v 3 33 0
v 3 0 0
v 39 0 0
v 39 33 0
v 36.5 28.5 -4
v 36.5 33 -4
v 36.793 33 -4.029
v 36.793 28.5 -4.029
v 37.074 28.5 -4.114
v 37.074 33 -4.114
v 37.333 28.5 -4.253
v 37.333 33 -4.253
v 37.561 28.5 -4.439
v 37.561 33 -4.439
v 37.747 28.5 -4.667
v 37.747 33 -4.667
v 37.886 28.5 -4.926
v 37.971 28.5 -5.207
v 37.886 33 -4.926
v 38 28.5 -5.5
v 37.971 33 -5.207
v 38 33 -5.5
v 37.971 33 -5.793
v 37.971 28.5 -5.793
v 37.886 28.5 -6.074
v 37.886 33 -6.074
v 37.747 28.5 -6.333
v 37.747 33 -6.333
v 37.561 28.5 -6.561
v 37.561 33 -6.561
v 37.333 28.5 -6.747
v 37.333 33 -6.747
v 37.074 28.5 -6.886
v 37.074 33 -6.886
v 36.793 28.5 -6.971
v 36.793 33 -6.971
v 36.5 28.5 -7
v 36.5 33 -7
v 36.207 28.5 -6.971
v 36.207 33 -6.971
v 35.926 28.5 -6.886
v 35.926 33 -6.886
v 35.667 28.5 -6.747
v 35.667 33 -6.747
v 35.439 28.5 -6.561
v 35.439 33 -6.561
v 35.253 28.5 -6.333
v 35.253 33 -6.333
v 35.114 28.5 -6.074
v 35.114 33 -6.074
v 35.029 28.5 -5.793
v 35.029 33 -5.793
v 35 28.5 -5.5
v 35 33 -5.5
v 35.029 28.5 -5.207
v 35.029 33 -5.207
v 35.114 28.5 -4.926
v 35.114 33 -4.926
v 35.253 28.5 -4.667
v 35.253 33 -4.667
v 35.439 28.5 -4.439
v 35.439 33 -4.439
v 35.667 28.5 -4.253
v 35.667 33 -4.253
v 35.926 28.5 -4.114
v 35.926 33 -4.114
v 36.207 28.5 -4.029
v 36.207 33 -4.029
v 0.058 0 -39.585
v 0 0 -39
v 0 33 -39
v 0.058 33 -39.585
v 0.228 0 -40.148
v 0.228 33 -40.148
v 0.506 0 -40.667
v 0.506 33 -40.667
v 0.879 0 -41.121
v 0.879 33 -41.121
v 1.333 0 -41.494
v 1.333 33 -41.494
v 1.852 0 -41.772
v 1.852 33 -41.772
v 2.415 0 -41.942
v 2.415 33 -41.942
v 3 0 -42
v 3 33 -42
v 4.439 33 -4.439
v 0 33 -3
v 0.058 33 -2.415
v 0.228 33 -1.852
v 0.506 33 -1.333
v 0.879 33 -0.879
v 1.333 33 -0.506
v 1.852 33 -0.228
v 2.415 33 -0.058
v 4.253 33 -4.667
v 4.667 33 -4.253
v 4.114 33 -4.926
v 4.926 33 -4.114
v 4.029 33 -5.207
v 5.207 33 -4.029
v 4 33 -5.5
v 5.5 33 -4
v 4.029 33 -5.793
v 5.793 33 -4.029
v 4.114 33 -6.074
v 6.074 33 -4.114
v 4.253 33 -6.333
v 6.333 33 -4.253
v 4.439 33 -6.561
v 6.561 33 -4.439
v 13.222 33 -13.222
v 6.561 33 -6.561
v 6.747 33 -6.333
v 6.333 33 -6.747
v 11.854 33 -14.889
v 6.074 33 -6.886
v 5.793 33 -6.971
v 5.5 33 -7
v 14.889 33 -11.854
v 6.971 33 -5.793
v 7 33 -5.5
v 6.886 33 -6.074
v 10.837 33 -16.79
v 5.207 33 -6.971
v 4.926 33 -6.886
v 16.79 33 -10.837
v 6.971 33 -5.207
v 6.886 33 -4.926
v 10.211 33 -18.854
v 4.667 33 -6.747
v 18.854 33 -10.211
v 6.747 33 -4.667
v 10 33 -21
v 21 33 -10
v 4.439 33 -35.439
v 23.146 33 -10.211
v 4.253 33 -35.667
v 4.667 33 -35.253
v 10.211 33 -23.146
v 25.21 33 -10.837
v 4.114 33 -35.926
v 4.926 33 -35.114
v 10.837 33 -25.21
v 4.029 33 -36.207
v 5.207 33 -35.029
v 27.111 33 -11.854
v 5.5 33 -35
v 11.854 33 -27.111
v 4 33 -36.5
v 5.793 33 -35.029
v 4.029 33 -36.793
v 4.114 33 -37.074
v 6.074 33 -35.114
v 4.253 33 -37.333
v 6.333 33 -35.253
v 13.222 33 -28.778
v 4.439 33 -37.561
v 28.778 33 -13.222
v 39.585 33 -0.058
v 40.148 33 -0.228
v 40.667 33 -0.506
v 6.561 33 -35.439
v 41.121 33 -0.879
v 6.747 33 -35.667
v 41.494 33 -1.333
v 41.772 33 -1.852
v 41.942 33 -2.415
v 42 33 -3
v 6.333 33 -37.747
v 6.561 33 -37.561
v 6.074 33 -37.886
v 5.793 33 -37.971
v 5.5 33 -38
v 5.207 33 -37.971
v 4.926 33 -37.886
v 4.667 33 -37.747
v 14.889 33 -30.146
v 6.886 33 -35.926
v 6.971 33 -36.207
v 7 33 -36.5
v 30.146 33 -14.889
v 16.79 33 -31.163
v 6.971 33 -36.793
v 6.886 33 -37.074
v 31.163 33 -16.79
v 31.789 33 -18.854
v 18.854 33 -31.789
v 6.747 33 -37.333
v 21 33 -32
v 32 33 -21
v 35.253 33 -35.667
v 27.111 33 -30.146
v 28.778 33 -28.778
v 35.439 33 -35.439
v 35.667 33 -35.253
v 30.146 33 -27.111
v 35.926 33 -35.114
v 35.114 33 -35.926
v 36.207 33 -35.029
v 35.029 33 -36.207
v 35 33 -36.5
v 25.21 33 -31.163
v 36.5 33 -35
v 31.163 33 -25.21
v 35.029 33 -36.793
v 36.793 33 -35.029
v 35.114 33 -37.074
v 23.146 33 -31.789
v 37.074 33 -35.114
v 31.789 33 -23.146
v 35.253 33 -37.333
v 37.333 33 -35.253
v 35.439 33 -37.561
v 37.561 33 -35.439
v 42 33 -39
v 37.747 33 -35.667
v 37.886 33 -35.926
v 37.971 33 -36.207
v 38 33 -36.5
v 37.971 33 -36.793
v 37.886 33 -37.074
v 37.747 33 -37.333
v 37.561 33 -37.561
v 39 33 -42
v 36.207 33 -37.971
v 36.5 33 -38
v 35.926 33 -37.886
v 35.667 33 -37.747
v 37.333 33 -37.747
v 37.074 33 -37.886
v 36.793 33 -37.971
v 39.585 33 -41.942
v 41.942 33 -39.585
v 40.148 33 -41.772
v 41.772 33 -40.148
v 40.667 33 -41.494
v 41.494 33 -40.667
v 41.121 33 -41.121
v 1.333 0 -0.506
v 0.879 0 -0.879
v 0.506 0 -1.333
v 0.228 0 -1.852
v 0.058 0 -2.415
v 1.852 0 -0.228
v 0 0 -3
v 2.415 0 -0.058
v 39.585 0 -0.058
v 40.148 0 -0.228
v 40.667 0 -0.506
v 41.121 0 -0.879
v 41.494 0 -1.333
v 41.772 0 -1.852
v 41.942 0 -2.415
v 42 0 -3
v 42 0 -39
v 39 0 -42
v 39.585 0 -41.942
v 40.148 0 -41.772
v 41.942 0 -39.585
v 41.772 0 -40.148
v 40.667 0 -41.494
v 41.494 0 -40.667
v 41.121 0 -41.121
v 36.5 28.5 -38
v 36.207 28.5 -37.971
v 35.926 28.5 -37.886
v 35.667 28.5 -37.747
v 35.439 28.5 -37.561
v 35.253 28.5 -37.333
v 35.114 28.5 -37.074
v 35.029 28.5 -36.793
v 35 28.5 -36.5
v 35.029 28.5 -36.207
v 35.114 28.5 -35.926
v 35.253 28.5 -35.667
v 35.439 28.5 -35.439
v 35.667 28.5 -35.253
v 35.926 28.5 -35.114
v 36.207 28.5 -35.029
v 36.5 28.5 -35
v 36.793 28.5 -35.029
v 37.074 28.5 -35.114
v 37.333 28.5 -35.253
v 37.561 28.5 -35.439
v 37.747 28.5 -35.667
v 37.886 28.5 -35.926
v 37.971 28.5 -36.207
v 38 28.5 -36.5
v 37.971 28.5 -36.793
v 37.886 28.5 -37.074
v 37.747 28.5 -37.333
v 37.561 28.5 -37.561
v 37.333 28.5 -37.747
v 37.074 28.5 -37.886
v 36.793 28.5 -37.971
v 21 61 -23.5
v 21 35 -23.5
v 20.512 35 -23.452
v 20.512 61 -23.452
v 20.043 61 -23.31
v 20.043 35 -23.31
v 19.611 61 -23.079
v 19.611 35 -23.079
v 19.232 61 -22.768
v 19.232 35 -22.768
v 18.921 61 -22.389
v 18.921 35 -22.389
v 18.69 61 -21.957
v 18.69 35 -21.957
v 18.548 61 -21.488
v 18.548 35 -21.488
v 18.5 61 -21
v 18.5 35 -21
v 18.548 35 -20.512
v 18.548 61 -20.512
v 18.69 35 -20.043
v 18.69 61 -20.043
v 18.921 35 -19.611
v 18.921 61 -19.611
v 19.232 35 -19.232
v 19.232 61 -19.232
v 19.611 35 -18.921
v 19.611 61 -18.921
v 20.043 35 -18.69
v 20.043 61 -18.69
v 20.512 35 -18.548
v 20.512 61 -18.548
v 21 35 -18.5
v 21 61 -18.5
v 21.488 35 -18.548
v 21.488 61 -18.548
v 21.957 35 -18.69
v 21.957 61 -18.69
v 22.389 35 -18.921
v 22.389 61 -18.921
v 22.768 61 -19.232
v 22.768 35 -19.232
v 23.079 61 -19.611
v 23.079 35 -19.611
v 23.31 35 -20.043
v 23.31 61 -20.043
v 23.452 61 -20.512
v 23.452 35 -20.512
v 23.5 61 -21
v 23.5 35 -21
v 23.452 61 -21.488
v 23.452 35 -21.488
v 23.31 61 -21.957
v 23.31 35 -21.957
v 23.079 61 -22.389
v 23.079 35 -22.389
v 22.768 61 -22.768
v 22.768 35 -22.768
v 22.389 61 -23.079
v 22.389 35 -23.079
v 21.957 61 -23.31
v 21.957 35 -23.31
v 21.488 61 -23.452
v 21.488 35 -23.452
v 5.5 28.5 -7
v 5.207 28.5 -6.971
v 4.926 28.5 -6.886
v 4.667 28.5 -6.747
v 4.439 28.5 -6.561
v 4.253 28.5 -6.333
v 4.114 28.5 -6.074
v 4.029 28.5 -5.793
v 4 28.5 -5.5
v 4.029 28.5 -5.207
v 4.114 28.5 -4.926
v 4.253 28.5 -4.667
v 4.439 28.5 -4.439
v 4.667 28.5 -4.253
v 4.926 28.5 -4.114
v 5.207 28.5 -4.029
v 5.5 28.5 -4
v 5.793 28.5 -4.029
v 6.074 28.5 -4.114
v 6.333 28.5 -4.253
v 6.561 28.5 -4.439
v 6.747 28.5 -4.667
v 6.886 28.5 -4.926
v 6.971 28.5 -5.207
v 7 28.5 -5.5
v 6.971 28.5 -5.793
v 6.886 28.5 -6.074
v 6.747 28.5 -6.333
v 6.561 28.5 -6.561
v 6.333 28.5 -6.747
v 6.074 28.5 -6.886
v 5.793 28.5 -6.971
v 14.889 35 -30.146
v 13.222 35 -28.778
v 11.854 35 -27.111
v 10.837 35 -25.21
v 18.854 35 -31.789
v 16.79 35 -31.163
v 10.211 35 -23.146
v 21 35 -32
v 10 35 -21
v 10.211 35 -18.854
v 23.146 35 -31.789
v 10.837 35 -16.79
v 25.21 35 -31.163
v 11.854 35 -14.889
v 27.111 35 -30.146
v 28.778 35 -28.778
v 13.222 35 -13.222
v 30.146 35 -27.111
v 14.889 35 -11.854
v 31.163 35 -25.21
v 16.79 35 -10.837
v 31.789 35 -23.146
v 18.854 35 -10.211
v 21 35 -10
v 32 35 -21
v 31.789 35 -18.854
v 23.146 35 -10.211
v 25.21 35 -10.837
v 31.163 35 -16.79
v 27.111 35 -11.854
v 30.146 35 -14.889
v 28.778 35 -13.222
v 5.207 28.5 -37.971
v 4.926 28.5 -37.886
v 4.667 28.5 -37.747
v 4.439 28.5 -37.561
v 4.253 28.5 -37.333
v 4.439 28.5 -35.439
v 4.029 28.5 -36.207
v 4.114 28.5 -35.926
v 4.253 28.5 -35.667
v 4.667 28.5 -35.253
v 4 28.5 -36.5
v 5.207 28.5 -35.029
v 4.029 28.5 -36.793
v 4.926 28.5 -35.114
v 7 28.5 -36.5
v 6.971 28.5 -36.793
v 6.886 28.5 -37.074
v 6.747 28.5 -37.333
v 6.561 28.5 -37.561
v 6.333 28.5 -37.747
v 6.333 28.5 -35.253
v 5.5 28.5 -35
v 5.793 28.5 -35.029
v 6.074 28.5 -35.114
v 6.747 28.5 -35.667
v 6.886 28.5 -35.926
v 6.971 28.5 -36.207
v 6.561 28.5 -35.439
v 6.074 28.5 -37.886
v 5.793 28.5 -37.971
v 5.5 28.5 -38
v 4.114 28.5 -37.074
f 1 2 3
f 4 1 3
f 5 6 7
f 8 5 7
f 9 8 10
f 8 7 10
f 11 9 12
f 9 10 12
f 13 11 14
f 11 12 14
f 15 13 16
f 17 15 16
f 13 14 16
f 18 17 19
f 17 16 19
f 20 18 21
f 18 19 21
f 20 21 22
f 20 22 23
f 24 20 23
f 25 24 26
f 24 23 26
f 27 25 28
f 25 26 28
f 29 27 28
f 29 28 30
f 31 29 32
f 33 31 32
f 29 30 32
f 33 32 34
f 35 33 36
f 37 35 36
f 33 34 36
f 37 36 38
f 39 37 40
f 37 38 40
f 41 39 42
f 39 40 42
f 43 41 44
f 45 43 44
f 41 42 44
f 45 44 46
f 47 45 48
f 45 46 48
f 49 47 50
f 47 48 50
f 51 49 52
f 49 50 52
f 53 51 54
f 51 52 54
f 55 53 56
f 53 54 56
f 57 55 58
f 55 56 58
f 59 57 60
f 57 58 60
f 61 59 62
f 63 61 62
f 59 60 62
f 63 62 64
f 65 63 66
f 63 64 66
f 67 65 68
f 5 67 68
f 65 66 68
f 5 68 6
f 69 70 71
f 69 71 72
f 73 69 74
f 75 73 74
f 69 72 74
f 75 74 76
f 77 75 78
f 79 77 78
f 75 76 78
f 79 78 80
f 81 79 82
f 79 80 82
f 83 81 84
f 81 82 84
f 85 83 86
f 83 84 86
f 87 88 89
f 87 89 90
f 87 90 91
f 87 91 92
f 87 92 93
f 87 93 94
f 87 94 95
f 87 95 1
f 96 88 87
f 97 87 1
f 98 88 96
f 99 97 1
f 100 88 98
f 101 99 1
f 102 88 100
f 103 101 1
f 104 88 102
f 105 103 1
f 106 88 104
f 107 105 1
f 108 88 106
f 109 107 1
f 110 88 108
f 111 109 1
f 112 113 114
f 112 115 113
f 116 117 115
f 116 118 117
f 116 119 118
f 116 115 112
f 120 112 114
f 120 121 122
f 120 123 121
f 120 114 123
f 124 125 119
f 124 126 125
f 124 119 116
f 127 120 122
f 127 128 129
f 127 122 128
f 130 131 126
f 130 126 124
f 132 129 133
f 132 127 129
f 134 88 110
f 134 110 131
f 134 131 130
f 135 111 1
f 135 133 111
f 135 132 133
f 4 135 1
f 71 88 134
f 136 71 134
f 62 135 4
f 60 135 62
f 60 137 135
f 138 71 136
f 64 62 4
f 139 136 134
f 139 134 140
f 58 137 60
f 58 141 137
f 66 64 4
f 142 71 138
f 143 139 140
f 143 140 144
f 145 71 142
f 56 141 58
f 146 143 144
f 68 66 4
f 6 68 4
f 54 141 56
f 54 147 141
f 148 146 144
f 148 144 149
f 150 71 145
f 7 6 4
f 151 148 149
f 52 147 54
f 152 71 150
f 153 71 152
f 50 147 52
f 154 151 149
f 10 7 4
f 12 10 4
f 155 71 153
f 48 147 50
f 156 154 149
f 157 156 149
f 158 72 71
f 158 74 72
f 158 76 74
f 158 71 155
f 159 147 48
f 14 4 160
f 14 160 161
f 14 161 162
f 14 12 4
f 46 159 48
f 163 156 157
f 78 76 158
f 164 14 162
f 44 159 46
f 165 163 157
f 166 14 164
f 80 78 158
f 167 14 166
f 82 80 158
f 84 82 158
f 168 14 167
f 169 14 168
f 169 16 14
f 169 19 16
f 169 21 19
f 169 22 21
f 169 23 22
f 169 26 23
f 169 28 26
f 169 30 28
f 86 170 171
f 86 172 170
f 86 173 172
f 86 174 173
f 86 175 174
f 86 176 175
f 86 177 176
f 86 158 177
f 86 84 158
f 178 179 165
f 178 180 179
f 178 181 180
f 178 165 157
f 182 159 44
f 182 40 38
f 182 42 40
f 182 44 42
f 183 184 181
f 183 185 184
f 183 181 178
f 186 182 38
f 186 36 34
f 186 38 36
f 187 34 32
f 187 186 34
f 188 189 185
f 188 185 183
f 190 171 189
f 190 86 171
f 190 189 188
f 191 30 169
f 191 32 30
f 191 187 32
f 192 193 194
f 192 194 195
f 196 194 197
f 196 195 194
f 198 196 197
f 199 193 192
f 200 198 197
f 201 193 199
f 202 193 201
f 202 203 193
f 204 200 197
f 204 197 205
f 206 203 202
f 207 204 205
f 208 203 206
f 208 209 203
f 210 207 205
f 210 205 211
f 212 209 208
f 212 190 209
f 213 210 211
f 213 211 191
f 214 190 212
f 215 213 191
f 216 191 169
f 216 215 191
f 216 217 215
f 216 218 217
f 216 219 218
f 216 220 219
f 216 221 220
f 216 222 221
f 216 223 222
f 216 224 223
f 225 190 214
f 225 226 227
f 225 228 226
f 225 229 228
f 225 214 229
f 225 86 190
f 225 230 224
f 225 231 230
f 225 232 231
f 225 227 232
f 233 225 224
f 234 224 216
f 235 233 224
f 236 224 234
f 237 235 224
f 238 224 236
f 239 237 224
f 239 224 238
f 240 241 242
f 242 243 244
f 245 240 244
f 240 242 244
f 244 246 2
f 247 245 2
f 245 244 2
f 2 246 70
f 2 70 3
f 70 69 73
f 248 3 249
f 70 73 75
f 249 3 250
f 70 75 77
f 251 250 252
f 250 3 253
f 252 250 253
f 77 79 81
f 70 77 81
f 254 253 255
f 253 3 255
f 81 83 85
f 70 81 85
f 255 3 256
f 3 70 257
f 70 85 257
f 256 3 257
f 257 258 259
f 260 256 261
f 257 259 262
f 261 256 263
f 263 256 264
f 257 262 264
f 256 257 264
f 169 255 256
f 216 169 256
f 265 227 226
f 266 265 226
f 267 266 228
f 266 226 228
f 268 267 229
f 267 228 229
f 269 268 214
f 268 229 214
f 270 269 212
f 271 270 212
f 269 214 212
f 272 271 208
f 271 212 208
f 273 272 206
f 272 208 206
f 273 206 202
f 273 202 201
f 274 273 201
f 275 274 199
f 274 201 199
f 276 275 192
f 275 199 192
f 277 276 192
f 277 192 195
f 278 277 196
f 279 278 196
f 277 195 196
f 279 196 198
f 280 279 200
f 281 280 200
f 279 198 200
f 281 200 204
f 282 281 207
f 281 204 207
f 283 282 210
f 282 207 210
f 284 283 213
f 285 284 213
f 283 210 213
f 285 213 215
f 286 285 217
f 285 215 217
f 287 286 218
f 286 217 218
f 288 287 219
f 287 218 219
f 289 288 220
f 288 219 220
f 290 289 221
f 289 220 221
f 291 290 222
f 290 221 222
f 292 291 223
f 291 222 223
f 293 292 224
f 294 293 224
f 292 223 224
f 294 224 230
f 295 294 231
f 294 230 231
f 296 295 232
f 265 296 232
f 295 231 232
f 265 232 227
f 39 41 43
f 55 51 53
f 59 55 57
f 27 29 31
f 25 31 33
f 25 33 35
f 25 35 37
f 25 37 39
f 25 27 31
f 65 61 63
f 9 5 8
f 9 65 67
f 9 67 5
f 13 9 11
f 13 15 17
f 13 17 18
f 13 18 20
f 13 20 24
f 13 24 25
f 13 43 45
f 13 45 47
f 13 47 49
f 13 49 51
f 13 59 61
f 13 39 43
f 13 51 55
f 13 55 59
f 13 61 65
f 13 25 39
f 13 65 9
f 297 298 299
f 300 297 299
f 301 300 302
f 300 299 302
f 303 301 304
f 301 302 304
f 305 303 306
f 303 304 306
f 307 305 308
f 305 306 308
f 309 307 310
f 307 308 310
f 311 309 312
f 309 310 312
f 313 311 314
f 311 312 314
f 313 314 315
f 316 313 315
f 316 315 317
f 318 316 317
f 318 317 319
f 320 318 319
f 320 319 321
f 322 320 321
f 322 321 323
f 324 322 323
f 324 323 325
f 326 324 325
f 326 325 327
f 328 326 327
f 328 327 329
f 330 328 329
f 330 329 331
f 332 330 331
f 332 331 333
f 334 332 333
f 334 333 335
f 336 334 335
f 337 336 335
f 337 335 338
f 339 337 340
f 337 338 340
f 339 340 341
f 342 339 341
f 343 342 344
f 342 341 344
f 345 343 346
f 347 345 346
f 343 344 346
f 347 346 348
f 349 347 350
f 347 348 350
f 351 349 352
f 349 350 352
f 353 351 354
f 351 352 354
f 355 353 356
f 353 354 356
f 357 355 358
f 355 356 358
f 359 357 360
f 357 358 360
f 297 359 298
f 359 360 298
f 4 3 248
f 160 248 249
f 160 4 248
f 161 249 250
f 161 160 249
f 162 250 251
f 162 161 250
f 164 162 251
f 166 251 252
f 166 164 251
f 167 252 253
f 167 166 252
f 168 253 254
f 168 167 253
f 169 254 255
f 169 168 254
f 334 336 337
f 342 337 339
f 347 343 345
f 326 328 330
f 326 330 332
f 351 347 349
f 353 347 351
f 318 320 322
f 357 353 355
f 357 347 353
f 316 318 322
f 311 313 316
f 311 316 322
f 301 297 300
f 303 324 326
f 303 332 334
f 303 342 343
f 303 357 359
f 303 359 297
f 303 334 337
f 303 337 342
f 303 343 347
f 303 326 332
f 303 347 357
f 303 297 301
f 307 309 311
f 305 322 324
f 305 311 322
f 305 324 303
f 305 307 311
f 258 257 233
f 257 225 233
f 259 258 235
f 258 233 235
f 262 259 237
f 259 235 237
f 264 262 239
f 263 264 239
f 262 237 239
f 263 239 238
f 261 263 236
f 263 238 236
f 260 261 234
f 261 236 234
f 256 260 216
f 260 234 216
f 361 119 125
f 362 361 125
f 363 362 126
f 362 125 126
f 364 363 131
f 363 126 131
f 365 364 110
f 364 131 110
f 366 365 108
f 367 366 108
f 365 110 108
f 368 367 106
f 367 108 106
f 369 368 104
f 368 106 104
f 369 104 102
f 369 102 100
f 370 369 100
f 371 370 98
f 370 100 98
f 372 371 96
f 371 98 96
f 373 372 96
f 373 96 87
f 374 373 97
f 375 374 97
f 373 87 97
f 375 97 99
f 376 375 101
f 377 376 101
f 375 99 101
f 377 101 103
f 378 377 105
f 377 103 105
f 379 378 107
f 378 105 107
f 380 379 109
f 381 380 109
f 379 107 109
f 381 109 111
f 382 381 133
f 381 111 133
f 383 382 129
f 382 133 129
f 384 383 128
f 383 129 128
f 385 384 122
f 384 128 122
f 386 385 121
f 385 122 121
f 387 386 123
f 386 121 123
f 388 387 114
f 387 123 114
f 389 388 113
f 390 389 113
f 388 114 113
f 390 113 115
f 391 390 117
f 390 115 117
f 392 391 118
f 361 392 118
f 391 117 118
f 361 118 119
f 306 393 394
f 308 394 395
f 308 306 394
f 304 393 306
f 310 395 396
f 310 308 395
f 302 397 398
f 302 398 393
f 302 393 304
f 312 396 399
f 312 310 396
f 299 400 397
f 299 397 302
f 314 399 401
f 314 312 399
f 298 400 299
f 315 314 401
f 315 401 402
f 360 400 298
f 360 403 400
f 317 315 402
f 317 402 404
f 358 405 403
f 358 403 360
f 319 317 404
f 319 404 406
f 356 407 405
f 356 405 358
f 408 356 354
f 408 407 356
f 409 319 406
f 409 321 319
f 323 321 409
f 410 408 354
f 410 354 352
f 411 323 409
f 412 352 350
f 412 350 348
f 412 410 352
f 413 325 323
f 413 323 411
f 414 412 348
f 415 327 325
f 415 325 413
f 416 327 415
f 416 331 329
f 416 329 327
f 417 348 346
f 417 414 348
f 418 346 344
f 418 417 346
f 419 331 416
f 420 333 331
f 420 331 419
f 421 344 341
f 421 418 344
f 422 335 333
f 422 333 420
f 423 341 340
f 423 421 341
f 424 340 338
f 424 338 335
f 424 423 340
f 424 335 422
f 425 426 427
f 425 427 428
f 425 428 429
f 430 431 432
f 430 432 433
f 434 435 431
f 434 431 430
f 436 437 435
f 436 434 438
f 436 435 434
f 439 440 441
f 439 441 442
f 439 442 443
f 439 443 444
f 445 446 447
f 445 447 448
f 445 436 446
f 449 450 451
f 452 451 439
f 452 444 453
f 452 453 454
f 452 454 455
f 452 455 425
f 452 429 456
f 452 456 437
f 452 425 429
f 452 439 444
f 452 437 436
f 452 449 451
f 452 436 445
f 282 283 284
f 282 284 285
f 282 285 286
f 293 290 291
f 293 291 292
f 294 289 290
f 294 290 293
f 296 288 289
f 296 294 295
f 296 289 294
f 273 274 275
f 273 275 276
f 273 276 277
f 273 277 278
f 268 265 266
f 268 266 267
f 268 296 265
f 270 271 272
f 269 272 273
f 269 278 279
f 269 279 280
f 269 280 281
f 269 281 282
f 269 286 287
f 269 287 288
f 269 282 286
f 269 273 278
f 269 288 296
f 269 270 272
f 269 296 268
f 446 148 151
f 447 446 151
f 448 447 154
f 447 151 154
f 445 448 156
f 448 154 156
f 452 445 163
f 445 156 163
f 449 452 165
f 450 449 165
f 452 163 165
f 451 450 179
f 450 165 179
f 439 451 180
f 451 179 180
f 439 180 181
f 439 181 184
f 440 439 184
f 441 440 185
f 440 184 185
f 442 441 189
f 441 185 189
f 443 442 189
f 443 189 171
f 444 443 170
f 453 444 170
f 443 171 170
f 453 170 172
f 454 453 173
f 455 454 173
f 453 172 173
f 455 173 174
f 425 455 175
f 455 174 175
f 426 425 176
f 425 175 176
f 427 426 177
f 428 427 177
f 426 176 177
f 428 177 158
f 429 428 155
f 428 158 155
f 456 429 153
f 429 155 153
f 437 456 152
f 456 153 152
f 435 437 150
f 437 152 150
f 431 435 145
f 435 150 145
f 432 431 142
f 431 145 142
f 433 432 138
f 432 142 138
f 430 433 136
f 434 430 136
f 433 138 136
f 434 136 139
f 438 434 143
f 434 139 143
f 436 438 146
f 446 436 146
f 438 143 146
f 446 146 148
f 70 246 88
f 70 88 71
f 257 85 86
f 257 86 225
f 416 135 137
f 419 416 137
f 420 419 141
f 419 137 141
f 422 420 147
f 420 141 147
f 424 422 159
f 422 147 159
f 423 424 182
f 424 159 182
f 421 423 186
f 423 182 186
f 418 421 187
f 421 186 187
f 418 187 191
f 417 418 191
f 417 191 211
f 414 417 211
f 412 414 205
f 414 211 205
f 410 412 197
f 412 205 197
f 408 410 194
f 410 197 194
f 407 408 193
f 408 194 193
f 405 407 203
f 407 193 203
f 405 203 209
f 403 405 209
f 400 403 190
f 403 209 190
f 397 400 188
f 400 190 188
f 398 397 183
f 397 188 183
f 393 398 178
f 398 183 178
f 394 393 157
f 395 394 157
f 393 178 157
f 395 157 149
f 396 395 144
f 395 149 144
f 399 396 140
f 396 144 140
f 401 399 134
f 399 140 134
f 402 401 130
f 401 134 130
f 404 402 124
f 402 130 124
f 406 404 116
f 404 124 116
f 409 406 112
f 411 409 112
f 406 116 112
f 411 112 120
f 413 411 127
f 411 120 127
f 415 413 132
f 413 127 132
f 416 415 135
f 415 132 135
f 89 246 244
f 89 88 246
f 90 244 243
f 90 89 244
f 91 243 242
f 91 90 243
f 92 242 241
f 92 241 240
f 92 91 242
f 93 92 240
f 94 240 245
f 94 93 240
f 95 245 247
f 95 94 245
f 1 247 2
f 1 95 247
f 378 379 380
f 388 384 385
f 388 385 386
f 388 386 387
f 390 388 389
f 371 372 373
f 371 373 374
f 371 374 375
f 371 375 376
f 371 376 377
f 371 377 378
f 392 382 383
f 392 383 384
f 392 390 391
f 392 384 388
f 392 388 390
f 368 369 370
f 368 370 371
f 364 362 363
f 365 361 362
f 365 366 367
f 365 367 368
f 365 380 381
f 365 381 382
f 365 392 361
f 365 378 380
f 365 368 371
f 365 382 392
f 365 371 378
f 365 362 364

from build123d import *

# Parameters (mm, degrees)
SKETCH1_W           = 42
SKETCH1_H           = 42
BOSS_EXTRUDE1_DEPTH = 33
SKETCH2_R           = 2.5
BOSS_EXTRUDE2_DEPTH = 28
FILLET1_R           = 3
SKETCH3_R           = 1.5
CUT_EXTRUDE1_DEPTH  = 4.5
SKETCH4_R           = 11
BOSS_EXTRUDE3_DEPTH = 2


with BuildPart() as part:
    # Sketch1 → Boss-Extrude1 (new body)
    with BuildSketch(Plane(origin=(0, 0, 0), x_dir=(1, 0, 0), z_dir=(0, 1, 0))):
        with Locations((21, 21)):
            Rectangle(SKETCH1_W, SKETCH1_H)
    extrude(amount=BOSS_EXTRUDE1_DEPTH)

    # Sketch2 → Boss-Extrude2 (add)
    with BuildSketch(Plane(origin=(0, 33, 0), x_dir=(1, 0, 0), z_dir=(0, 1, 0))):
        with Locations(Location((21, 21, 0), (0, 0, 90))):
            Circle(SKETCH2_R)
    extrude(amount=BOSS_EXTRUDE2_DEPTH)

    # Fillet1
    fillet1_edges = [part.edges().sort_by_distance(p)[0] for p in [
        (42, 16.5, -42),
        (42, 16.5, 0),
        (0, 16.5, 0),
        (0, 16.5, -42),
    ]]
    fillet(fillet1_edges, radius=FILLET1_R)

    # Sketch3 → Cut-Extrude1 (cut)
    with BuildSketch(Plane(origin=(0, 33, 0), x_dir=(1, 0, 0), z_dir=(0, 1, 0))):
        with Locations(Location((5.5, 36.5, 0), (0, 0, 270))):
            Circle(SKETCH3_R)
        with Locations(Location((5.5, 5.5, 0), (0, 0, 90))):
            Circle(SKETCH3_R)
        with Locations(Location((36.5, 5.5, 0), (0, 0, 270))):
            Circle(SKETCH3_R)
        with Locations(Location((36.5, 36.5, 0), (0, 0, 90))):
            Circle(SKETCH3_R)
    extrude(amount=-CUT_EXTRUDE1_DEPTH, mode=Mode.SUBTRACT)

    # Sketch4 → Boss-Extrude3 (add)
    with BuildSketch(Plane(origin=(0, 33, 0), x_dir=(1, 0, 0), z_dir=(0, 1, 0))):
        with Locations(Location((21, 21, 0), (0, 0, 270))):
            Circle(SKETCH4_R)
    extrude(amount=BOSS_EXTRUDE3_DEPTH)


solid = part.part
